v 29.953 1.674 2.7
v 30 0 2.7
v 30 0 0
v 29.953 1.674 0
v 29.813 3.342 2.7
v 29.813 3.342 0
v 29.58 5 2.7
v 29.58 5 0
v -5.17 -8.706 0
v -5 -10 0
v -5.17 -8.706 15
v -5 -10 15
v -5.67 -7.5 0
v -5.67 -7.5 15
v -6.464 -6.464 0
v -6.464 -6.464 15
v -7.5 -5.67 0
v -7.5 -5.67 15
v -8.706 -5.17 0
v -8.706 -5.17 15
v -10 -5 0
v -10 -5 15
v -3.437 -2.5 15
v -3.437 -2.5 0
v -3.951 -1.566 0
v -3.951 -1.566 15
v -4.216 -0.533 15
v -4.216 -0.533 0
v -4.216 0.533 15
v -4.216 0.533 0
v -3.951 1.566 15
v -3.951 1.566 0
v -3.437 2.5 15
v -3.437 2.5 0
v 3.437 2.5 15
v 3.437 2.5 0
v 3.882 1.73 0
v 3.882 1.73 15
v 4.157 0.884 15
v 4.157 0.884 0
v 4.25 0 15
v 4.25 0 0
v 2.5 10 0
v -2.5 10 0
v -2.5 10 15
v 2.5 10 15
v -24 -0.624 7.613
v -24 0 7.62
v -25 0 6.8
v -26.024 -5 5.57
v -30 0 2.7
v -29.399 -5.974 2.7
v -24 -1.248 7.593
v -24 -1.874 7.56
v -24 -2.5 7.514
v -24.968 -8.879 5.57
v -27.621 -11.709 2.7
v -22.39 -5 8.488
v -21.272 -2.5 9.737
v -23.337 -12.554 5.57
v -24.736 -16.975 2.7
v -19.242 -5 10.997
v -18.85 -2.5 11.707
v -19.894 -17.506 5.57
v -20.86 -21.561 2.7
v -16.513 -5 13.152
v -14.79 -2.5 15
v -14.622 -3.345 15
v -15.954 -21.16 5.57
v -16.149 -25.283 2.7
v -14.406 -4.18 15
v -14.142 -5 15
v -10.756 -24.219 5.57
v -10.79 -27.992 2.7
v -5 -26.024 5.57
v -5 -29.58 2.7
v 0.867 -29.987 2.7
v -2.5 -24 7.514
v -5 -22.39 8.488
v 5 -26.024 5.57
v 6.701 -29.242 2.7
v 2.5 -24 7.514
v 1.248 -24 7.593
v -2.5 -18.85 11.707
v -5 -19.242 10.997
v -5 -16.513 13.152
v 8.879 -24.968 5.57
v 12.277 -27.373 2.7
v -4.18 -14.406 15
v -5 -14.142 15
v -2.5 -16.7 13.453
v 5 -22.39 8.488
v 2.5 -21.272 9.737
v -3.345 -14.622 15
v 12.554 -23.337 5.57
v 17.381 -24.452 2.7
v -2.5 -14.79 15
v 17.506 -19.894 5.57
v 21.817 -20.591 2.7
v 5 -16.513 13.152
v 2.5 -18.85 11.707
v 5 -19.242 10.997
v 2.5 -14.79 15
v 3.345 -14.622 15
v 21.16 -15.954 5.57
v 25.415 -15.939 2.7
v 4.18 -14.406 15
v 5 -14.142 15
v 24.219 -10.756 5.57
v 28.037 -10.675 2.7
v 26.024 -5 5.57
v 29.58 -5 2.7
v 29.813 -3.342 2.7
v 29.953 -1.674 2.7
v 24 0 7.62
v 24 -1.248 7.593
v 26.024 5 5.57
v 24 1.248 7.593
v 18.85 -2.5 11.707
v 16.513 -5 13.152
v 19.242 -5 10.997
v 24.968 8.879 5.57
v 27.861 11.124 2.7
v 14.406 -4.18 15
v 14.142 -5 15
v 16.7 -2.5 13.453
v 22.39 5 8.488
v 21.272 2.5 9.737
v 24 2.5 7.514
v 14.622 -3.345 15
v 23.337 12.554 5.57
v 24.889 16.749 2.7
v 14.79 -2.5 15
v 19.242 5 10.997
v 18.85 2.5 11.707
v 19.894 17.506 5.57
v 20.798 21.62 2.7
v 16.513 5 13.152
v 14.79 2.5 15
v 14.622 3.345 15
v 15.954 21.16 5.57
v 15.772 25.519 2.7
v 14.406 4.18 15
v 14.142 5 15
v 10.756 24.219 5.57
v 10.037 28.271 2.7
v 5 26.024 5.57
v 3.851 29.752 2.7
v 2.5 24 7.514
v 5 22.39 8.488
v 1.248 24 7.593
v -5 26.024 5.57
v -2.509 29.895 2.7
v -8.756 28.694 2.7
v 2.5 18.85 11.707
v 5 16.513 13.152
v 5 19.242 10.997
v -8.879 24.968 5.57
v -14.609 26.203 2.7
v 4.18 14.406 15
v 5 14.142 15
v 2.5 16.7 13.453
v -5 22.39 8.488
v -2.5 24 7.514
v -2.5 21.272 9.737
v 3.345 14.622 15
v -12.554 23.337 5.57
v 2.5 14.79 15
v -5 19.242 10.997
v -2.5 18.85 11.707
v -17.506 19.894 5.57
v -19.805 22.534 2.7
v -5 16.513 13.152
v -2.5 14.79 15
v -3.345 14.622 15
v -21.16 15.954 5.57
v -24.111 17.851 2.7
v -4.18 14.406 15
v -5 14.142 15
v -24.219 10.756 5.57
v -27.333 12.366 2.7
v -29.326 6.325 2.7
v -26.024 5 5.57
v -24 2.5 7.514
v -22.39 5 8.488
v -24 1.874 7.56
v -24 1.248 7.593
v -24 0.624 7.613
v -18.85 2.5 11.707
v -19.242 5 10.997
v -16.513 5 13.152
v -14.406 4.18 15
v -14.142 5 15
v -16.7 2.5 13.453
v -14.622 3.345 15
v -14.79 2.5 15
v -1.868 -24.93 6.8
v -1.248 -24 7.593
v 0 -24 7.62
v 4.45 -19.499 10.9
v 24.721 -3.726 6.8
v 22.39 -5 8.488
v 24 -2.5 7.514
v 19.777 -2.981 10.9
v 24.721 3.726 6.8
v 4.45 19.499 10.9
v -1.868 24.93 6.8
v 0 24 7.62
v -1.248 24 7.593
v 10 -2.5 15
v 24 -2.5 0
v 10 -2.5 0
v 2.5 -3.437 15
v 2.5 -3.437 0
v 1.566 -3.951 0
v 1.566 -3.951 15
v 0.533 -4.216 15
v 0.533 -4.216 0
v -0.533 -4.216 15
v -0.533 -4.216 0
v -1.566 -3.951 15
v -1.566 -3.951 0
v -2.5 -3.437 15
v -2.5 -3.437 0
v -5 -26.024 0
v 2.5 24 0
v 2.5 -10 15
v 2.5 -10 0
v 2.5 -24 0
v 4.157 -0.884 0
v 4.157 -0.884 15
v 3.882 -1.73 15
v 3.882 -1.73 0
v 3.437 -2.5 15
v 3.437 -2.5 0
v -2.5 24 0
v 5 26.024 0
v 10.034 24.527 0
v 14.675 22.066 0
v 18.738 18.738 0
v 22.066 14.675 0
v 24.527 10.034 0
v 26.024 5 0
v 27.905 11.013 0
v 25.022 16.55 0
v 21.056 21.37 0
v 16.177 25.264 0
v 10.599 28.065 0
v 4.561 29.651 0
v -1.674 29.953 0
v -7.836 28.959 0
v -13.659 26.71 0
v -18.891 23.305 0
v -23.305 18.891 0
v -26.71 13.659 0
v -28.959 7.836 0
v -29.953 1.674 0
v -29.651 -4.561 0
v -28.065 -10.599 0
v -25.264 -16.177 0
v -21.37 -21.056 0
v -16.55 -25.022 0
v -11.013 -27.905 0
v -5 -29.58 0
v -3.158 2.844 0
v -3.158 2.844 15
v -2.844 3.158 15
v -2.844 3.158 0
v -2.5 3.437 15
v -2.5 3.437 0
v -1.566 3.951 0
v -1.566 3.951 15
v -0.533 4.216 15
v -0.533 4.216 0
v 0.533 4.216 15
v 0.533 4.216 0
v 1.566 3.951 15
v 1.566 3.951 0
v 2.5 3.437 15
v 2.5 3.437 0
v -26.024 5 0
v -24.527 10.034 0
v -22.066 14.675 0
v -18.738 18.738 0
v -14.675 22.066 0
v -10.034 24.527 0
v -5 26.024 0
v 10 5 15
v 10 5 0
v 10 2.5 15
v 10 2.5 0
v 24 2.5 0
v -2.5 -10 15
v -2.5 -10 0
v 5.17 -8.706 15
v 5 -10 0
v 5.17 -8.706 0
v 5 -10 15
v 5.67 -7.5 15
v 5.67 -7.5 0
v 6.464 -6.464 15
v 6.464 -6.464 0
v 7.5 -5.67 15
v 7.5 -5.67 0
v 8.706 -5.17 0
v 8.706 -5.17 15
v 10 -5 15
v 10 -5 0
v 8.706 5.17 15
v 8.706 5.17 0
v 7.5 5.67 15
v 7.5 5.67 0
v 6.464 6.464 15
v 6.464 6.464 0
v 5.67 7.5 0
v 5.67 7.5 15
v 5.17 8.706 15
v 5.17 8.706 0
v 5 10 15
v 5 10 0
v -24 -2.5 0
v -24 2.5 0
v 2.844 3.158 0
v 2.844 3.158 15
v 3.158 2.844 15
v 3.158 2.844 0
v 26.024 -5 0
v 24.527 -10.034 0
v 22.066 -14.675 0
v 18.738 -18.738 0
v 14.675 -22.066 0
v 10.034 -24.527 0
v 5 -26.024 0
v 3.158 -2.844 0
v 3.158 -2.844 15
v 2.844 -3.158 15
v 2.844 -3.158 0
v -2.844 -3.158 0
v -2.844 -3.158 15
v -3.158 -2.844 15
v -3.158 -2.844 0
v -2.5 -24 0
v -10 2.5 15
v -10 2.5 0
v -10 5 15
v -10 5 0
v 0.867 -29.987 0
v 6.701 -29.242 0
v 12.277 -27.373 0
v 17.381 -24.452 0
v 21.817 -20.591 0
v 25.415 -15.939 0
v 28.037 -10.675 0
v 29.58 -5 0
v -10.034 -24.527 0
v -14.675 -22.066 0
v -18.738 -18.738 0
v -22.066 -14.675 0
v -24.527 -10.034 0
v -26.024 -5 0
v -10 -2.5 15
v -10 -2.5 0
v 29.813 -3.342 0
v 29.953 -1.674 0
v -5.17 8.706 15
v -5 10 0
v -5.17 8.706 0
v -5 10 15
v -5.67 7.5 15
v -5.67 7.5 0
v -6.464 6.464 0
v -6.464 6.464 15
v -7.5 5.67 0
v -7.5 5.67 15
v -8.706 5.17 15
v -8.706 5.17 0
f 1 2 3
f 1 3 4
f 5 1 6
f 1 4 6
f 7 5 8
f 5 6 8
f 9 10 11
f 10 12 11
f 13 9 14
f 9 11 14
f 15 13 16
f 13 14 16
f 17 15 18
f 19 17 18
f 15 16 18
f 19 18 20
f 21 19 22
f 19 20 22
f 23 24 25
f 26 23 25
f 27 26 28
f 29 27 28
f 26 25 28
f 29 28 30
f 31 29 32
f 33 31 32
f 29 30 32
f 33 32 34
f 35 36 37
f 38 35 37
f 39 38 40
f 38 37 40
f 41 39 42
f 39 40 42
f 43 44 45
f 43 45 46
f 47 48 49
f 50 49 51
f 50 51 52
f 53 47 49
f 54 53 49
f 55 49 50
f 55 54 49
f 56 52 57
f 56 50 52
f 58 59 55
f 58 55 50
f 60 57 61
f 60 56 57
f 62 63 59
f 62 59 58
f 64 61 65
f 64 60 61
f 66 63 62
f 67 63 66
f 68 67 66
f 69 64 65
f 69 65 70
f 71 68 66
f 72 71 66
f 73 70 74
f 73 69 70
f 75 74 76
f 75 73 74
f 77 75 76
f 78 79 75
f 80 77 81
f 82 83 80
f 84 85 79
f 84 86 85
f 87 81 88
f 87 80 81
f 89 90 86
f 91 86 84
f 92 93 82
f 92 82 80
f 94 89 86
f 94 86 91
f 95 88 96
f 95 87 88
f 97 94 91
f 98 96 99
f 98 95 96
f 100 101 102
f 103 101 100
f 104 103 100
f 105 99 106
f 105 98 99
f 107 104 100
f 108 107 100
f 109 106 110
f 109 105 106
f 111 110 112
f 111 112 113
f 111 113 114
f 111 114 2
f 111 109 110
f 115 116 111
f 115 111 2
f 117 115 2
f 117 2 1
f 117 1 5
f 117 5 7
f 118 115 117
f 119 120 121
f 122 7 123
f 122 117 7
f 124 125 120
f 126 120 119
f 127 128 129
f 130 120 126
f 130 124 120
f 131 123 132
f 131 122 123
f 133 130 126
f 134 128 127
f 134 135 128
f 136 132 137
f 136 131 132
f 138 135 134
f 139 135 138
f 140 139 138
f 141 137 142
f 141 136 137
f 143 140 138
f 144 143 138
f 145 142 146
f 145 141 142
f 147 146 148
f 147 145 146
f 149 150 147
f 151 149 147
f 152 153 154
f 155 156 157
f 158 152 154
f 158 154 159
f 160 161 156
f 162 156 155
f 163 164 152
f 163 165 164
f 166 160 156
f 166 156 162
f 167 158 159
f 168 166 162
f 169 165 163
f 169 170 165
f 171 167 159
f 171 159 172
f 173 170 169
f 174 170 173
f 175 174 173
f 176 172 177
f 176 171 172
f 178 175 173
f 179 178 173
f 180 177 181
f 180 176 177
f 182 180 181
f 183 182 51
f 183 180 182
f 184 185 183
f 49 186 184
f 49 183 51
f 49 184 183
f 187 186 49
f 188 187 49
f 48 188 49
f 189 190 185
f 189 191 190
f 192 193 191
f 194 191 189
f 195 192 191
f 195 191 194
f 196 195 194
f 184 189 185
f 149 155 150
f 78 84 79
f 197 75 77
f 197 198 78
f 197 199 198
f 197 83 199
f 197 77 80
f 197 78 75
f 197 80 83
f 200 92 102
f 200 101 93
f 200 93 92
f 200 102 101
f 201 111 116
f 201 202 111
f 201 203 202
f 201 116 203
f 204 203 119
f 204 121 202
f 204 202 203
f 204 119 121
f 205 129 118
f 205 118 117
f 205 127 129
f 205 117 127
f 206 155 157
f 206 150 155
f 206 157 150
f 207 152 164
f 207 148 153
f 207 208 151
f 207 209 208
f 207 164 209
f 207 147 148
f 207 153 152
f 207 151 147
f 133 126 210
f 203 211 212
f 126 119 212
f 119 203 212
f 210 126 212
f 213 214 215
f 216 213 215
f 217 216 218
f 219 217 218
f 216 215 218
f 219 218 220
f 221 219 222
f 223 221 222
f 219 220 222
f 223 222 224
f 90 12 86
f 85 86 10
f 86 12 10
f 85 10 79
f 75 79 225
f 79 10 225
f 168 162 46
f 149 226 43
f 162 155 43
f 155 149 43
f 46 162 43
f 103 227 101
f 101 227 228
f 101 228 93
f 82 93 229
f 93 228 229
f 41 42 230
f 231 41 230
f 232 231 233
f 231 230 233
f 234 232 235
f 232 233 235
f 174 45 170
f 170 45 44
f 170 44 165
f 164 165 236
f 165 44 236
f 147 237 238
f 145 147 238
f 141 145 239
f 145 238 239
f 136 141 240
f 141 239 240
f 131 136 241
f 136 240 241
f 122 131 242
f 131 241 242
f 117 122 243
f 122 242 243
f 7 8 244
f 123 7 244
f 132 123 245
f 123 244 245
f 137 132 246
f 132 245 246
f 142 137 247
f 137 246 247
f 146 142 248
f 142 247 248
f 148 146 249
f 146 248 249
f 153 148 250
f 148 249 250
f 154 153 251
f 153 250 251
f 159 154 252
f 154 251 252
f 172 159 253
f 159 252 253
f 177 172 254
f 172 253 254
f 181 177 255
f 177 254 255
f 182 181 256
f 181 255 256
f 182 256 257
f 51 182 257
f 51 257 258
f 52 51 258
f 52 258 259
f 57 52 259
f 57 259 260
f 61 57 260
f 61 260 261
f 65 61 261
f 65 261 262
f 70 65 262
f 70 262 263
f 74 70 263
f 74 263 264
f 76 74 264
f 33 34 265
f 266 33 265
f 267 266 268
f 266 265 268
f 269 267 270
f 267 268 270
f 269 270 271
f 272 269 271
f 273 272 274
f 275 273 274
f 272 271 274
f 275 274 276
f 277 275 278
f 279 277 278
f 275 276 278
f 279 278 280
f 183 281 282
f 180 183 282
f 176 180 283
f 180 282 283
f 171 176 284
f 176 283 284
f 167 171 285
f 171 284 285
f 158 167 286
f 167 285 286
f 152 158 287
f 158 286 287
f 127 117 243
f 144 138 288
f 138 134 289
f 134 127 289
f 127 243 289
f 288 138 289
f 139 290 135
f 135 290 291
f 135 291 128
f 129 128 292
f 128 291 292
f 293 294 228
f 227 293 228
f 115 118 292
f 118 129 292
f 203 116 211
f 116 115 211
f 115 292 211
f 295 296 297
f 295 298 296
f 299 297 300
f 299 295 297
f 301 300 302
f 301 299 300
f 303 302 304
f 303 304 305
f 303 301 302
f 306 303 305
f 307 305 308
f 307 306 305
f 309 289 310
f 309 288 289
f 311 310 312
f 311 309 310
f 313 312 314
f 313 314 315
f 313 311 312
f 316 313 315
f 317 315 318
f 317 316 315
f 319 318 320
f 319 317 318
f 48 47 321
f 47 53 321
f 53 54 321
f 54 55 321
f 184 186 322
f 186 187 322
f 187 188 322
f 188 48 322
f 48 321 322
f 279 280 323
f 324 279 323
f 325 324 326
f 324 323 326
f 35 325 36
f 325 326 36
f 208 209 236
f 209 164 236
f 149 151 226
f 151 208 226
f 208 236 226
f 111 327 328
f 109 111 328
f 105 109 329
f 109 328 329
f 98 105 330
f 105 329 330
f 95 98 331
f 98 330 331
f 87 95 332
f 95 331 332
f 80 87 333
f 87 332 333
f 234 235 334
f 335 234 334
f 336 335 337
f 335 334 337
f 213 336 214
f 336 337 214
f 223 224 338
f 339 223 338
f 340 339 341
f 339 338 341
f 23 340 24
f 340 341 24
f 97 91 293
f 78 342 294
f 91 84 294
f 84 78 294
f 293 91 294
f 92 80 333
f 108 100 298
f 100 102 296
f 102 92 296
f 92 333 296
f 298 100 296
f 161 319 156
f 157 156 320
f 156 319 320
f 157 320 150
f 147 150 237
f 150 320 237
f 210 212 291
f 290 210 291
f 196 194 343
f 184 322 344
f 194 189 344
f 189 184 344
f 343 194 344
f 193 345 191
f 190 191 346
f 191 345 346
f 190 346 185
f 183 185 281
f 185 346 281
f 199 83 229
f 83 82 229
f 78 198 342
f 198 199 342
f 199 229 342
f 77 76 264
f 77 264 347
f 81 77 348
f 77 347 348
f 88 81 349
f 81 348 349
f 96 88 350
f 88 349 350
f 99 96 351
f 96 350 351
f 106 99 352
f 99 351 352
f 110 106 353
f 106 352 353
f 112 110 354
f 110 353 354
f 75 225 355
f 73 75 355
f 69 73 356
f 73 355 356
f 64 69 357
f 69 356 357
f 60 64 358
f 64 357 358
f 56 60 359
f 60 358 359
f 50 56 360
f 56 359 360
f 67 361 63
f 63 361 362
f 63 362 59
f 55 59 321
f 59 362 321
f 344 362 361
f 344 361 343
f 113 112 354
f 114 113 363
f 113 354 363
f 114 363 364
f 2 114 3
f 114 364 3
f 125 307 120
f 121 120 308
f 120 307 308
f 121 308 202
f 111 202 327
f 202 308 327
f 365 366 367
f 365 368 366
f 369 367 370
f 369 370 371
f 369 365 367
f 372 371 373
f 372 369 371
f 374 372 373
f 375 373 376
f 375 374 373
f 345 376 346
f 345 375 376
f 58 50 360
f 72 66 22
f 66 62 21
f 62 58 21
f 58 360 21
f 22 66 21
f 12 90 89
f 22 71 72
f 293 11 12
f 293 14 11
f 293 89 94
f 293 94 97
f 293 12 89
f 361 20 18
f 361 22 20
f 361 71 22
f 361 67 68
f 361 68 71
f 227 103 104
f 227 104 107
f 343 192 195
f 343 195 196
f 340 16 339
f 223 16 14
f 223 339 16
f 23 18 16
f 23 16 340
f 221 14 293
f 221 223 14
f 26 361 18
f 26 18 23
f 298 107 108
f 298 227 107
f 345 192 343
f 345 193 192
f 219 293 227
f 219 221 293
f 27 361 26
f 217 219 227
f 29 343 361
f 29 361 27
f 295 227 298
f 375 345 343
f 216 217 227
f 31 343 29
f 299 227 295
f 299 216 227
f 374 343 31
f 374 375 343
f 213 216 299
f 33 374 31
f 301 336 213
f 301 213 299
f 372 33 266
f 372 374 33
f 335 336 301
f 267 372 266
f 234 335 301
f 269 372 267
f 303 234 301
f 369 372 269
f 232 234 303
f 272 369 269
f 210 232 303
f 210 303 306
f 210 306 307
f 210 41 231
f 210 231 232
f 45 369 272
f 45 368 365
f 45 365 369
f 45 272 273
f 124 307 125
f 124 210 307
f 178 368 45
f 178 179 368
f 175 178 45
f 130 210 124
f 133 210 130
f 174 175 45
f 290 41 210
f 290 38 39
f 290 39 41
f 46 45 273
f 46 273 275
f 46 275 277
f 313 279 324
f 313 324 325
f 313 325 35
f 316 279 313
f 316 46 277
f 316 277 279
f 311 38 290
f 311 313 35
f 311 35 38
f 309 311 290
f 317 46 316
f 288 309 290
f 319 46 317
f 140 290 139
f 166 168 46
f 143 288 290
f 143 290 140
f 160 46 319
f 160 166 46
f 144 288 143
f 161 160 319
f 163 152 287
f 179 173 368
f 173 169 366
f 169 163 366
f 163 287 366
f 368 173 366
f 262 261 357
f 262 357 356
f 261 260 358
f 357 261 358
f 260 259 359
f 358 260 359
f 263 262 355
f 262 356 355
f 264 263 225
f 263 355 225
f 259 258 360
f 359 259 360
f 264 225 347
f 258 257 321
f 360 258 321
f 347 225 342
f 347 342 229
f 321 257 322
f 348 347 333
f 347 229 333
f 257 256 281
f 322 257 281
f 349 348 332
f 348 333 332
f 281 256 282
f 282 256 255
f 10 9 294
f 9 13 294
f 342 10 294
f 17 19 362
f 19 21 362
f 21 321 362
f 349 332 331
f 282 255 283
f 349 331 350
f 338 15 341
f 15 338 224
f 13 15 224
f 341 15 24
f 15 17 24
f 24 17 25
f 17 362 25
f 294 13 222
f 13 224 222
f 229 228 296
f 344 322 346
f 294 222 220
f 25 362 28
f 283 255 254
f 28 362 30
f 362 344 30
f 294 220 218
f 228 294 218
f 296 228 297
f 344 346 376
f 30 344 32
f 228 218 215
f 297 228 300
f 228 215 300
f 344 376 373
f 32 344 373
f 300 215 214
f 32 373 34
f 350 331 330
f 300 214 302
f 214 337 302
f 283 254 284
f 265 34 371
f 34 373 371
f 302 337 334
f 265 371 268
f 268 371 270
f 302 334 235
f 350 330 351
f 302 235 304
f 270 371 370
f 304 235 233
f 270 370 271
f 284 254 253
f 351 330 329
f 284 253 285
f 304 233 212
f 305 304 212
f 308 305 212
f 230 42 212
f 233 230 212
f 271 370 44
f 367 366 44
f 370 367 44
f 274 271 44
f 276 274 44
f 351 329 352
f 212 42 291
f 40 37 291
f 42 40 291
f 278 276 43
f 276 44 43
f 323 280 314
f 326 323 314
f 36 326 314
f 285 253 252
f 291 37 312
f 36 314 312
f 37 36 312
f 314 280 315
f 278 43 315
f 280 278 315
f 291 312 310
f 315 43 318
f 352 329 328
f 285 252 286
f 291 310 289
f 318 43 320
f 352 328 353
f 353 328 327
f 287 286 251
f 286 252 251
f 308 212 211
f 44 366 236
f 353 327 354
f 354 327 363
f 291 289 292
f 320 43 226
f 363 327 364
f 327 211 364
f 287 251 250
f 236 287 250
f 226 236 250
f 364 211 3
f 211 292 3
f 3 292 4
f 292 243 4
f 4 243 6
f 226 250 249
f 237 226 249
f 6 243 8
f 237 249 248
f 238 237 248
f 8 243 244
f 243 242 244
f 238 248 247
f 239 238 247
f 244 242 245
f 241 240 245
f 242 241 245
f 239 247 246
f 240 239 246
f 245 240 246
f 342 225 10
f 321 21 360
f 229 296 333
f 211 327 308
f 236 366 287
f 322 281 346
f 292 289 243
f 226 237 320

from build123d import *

# Parameters (mm, degrees)
F1_W     = 5
F1_H     = 2.5
F1_W_2   = 2.5
F1_H_2   = 5
F2_DEPTH = 15
F5_R     = 5


with BuildPart() as f2:
    # F1 (on Top) → F2 (new body)
    with BuildSketch(Plane.XY):
        with BuildLine():
            ThreePointArc((-26.0240273593, 5), (-18.7383297014, 18.7383297014), (-5, 26.0240273593))
            Line((-5, 26.0240273593), (-5, 29.5803989155))
            ThreePointArc((-5, 29.5803989155), (-21.2132034356, 21.2132034356), (-29.5803989155, 5))
            Line((-29.5803989155, 5), (-26.0240273593, 5))
        make_face()
        with BuildLine():
            ThreePointArc((-26.0240273593, -5), (-26.5, 0), (-26.0240273593, 5))
            Line((-26.0240273593, 5), (-29.5803989155, 5))
            ThreePointArc((-29.5803989155, 5), (-30, 0), (-29.5803989155, -5))
            Line((-29.5803989155, -5), (-26.0240273593, -5))
        make_face()
        with BuildLine():
            Line((-5, -29.5803989155), (-5, -26.0240273593))
            ThreePointArc((-5, -26.0240273593), (-18.7383297014, -18.7383297014), (-26.0240273593, -5))
            Line((-26.0240273593, -5), (-29.5803989155, -5))
            ThreePointArc((-29.5803989155, -5), (-21.2132034356, -21.2132034356), (-5, -29.5803989155))
        make_face()
        with BuildLine():
            Line((-24, 2.5), (-10, 2.5))
            Line((-10, 2.5), (-10, 5))
            Line((-10, 5), (-26.0240273593, 5))
            ThreePointArc((-26.0240273593, 5), (-26.5, 0), (-26.0240273593, -5))
            Line((-26.0240273593, -5), (-10, -5))
            Line((-10, -5), (-10, -2.5))
            Line((-10, -2.5), (-24, -2.5))
            Line((-24, -2.5), (-24, 2.5))
        make_face()
        with BuildLine():
            Line((5, -10), (2.5, -10))
            Line((2.5, -10), (2.5, -24))
            Line((2.5, -24), (-2.5, -24))
            Line((-2.5, -24), (-2.5, -10))
            Line((-2.5, -10), (-5, -10))
            Line((-5, -10), (-5, -26.0240273593))
            ThreePointArc((-5, -26.0240273593), (0, -26.5), (5, -26.0240273593))
            Line((5, -26.0240273593), (5, -10))
        make_face()
        with BuildLine():
            Line((10, 5), (10, 2.5))
            Line((10, 2.5), (24, 2.5))
            Line((24, 2.5), (24, -2.5))
            Line((24, -2.5), (10, -2.5))
            Line((10, -2.5), (10, -5))
            Line((10, -5), (26.0240273593, -5))
            ThreePointArc((26.0240273593, -5), (26.3807384755, -2.5113019509), (26.5, 0))
            ThreePointArc((26.5, 0), (26.3807384755, 2.5113019509), (26.0240273593, 5))
            Line((26.0240273593, 5), (10, 5))
        make_face()
        with BuildLine():
            Line((2.5, 24), (2.5, 10))
            Line((2.5, 10), (5, 10))
            Line((5, 10), (5, 26.0240273593))
            ThreePointArc((5, 26.0240273593), (0, 26.5), (-5, 26.0240273593))
            Line((-5, 26.0240273593), (-5, 10))
            Line((-5, 10), (-2.5, 10))
            Line((-2.5, 10), (-2.5, 24))
            Line((-2.5, 24), (2.5, 24))
        make_face()
        with BuildLine():
            Line((5, 29.5803989155), (5, 26.0240273593))
            ThreePointArc((5, 26.0240273593), (18.7383297014, 18.7383297014), (26.0240273593, 5))
            Line((26.0240273593, 5), (29.5803989155, 5))
            ThreePointArc((29.5803989155, 5), (21.2132034356, 21.2132034356), (5, 29.5803989155))
        make_face()
        with BuildLine():
            ThreePointArc((-5, 26.0240273593), (0, 26.5), (5, 26.0240273593))
            Line((5, 26.0240273593), (5, 29.5803989155))
            ThreePointArc((5, 29.5803989155), (0, 30), (-5, 29.5803989155))
            Line((-5, 29.5803989155), (-5, 26.0240273593))
        make_face()
        with BuildLine():
            Line((29.5803989155, 5), (26.0240273593, 5))
            ThreePointArc((26.0240273593, 5), (26.3807384755, 2.5113019509), (26.5, 0))
            ThreePointArc((26.5, 0), (26.3807384755, -2.5113019509), (26.0240273593, -5))
            Line((26.0240273593, -5), (29.5803989155, -5))
            ThreePointArc((29.5803989155, -5), (29.8949156836, -2.5087878084), (30, 0))
            ThreePointArc((30, 0), (29.8949156836, 2.5087878084), (29.5803989155, 5))
        make_face()
        with BuildLine():
            ThreePointArc((2.5, 3.4369317712), (3.00520382, 3.00520382), (3.4369317712, 2.5))
            Line((3.4369317712, 2.5), (5, 2.5))
            Line((5, 2.5), (5, 5))
            Line((5, 5), (2.5, 5))
            Line((2.5, 5), (2.5, 3.4369317712))
        make_face()
        with BuildLine():
            ThreePointArc((-2.5, 3.4369317712), (0, 4.25), (2.5, 3.4369317712))
            Line((2.5, 3.4369317712), (2.5, 5))
            Line((2.5, 5), (-2.5, 5))
            Line((-2.5, 5), (-2.5, 3.4369317712))
        make_face()
        with BuildLine():
            ThreePointArc((-3.4369317712, 2.5), (-3.00520382, 3.00520382), (-2.5, 3.4369317712))
            Line((-2.5, 3.4369317712), (-2.5, 5))
            Line((-2.5, 5), (-5, 5))
            Line((-5, 5), (-5, 2.5))
            Line((-5, 2.5), (-3.4369317712, 2.5))
        make_face()
        with BuildLine():
            ThreePointArc((-3.4369317712, -2.5), (-4.25, 0), (-3.4369317712, 2.5))
            Line((-3.4369317712, 2.5), (-5, 2.5))
            Line((-5, 2.5), (-5, -2.5))
            Line((-5, -2.5), (-3.4369317712, -2.5))
        make_face()
        with BuildLine():
            Line((-2.5, -5), (-2.5, -3.4369317712))
            ThreePointArc((-2.5, -3.4369317712), (-3.00520382, -3.00520382), (-3.4369317712, -2.5))
            Line((-3.4369317712, -2.5), (-5, -2.5))
            Line((-5, -2.5), (-5, -5))
            Line((-5, -5), (-2.5, -5))
        make_face()
        with BuildLine():
            Line((2.5, -5), (2.5, -3.4369317712))
            ThreePointArc((2.5, -3.4369317712), (0, -4.25), (-2.5, -3.4369317712))
            Line((-2.5, -3.4369317712), (-2.5, -5))
            Line((-2.5, -5), (2.5, -5))
        make_face()
        with BuildLine():
            Line((5, -2.5), (3.4369317712, -2.5))
            ThreePointArc((3.4369317712, -2.5), (3.00520382, -3.00520382), (2.5, -3.4369317712))
            Line((2.5, -3.4369317712), (2.5, -5))
            Line((2.5, -5), (5, -5))
            Line((5, -5), (5, -2.5))
        make_face()
        with BuildLine():
            ThreePointArc((3.4369317712, 2.5), (4.041624675, 1.3144466464), (4.25, 0))
            ThreePointArc((4.25, 0), (4.041624675, -1.3144466464), (3.4369317712, -2.5))
            Line((3.4369317712, -2.5), (5, -2.5))
            Line((5, -2.5), (5, 2.5))
            Line((5, 2.5), (3.4369317712, 2.5))
        make_face()
        with BuildLine():
            ThreePointArc((26.0240273593, -5), (18.7383297014, -18.7383297014), (5, -26.0240273593))
            Line((5, -26.0240273593), (5, -29.5803989155))
            ThreePointArc((5, -29.5803989155), (21.2132034356, -21.2132034356), (29.5803989155, -5))
            Line((29.5803989155, -5), (26.0240273593, -5))
        make_face()
        with BuildLine():
            Line((5, -29.5803989155), (5, -26.0240273593))
            ThreePointArc((5, -26.0240273593), (0, -26.5), (-5, -26.0240273593))
            Line((-5, -26.0240273593), (-5, -29.5803989155))
            ThreePointArc((-5, -29.5803989155), (0, -30), (5, -29.5803989155))
        make_face()
        with Locations((-7.5, 3.75)):
            Rectangle(F1_W, F1_H)
        with Locations((7.5, 3.75)):
            Rectangle(F1_W, F1_H)
        with Locations((3.75, -7.5)):
            Rectangle(F1_W_2, F1_H_2)
        with Locations((0, -7.5)):
            Rectangle(F1_W, F1_H_2)
        with Locations((-3.75, -7.5)):
            Rectangle(F1_W_2, F1_H_2)
        with Locations((-7.5, -3.75)):
            Rectangle(F1_W, F1_H)
        with Locations((7.5, -3.75)):
            Rectangle(F1_W, F1_H)
        with Locations((3.75, 7.5)):
            Rectangle(F1_W_2, F1_H_2)
        with Locations((0, 7.5)):
            Rectangle(F1_W, F1_H_2)
        with Locations((-7.5, 0)):
            Rectangle(F1_W, F1_H_2)
        with Locations((7.5, 0)):
            Rectangle(F1_W, F1_H_2)
        with Locations((-3.75, 7.5)):
            Rectangle(F1_W_2, F1_H_2)
    extrude(amount=F2_DEPTH)

    # F3 (on Front) → F4 (revolve, cut)
    with BuildSketch(Plane.XZ):
        Polygon((-30, 15), (-30, 2.7), (-15, 15), align=None)
    revolve(axis=Axis((0, 0, 7.5), (0, 0, 1)), mode=Mode.SUBTRACT)

    # F5
    f5_edges = [f2.edges().sort_by_distance(p)[0] for p in [
        (5, 5, 7.5),
        (5, -5, 7.5),
        (-5, -5, 7.5),
        (-5, 5, 7.5),
    ]]
    fillet(f5_edges, radius=F5_R)


solid = f2.part
